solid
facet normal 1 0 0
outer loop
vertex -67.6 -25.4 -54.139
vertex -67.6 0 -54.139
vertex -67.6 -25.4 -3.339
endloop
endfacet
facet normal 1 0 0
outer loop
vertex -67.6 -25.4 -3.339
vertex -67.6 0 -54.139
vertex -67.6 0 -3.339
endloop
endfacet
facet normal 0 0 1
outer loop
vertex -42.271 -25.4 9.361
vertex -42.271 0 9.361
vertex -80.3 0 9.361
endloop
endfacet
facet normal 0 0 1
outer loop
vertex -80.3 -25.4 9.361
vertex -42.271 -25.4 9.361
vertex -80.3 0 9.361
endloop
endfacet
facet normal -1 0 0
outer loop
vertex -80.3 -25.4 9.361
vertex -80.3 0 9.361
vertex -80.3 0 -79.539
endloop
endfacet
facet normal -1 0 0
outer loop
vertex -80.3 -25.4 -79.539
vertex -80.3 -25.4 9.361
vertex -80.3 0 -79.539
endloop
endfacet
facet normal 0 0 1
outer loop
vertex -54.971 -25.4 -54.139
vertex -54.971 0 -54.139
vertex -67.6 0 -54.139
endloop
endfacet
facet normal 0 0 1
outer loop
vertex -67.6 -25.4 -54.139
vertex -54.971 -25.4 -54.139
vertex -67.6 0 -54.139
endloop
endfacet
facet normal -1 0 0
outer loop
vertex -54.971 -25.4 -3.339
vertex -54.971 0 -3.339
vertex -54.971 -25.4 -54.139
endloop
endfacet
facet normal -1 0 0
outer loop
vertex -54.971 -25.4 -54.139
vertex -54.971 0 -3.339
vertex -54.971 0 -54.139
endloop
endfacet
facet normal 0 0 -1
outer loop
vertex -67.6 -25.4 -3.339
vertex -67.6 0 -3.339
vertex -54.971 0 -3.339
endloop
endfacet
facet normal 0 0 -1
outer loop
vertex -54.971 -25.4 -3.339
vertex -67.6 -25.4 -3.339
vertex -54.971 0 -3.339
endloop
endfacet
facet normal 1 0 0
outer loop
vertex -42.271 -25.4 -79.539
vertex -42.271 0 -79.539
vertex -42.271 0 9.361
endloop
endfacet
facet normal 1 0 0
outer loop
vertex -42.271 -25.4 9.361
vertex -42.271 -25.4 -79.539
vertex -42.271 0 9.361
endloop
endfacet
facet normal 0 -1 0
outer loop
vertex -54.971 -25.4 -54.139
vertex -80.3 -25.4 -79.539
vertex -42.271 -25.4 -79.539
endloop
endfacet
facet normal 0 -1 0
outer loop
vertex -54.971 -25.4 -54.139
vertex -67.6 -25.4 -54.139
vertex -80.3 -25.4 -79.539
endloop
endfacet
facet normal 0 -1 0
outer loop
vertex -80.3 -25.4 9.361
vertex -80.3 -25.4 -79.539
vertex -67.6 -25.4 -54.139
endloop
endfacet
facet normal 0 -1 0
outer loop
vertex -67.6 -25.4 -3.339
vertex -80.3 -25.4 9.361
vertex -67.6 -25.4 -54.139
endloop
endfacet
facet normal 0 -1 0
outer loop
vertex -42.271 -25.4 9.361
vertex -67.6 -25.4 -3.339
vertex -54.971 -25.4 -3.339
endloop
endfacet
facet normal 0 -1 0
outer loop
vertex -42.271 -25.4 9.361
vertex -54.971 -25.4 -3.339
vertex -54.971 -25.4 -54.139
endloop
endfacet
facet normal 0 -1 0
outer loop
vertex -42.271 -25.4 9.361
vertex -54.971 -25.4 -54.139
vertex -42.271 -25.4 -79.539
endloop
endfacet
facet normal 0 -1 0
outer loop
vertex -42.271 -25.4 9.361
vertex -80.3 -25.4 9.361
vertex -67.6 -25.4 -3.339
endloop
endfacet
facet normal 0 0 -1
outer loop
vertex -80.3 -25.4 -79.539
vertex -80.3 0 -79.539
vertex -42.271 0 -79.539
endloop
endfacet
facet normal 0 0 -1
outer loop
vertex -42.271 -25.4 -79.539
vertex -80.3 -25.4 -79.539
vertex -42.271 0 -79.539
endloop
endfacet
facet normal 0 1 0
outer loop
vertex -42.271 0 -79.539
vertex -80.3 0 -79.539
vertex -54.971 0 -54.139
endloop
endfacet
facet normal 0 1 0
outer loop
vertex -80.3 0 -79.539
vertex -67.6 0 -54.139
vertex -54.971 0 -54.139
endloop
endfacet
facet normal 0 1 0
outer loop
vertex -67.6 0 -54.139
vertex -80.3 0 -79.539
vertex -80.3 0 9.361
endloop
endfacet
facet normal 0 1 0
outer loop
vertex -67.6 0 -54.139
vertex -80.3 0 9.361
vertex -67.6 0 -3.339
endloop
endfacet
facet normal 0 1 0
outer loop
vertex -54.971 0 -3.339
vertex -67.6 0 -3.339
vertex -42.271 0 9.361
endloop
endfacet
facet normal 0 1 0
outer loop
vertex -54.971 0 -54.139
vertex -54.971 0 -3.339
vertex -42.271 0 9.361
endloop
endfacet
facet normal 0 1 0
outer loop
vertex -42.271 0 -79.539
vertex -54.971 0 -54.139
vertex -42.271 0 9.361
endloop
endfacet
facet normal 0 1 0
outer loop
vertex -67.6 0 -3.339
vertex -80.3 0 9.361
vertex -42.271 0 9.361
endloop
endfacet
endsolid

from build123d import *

# Parameters (mm, degrees)
F0_W     = 12.7
F0_H     = 50.8
F1_DEPTH = 25.4


with BuildPart() as f1:
    # F0 (on Front) → F1 (new body)
    with BuildSketch(Plane.XZ):
        Polygon((-80.300115, 9.361282), (-80.300115, -3.338718), (-67.600115, -3.338718), (-54.970883, -3.338718), (-54.900115, -3.338718), (-42.270883, -3.338718), (-42.270883, 9.361282), (-54.900115, 9.361282), (-67.600115, 9.361282), align=None)
        with Locations((-73.950115, -28.738718)):
            Rectangle(F0_W, F0_H)
        Polygon((-54.970883, -3.338718), (-54.970883, -54.138718), (-42.270883, -54.138718), (-42.270883, -3.338718), (-54.900115, -3.338718), align=None)
        Polygon((-67.600115, -54.138718), (-80.300115, -54.138718), (-80.300115, -79.538718), (-42.270883, -79.538718), (-42.270883, -54.138718), (-54.970883, -54.138718), align=None)
    extrude(amount=F1_DEPTH)


solid = f1.part
